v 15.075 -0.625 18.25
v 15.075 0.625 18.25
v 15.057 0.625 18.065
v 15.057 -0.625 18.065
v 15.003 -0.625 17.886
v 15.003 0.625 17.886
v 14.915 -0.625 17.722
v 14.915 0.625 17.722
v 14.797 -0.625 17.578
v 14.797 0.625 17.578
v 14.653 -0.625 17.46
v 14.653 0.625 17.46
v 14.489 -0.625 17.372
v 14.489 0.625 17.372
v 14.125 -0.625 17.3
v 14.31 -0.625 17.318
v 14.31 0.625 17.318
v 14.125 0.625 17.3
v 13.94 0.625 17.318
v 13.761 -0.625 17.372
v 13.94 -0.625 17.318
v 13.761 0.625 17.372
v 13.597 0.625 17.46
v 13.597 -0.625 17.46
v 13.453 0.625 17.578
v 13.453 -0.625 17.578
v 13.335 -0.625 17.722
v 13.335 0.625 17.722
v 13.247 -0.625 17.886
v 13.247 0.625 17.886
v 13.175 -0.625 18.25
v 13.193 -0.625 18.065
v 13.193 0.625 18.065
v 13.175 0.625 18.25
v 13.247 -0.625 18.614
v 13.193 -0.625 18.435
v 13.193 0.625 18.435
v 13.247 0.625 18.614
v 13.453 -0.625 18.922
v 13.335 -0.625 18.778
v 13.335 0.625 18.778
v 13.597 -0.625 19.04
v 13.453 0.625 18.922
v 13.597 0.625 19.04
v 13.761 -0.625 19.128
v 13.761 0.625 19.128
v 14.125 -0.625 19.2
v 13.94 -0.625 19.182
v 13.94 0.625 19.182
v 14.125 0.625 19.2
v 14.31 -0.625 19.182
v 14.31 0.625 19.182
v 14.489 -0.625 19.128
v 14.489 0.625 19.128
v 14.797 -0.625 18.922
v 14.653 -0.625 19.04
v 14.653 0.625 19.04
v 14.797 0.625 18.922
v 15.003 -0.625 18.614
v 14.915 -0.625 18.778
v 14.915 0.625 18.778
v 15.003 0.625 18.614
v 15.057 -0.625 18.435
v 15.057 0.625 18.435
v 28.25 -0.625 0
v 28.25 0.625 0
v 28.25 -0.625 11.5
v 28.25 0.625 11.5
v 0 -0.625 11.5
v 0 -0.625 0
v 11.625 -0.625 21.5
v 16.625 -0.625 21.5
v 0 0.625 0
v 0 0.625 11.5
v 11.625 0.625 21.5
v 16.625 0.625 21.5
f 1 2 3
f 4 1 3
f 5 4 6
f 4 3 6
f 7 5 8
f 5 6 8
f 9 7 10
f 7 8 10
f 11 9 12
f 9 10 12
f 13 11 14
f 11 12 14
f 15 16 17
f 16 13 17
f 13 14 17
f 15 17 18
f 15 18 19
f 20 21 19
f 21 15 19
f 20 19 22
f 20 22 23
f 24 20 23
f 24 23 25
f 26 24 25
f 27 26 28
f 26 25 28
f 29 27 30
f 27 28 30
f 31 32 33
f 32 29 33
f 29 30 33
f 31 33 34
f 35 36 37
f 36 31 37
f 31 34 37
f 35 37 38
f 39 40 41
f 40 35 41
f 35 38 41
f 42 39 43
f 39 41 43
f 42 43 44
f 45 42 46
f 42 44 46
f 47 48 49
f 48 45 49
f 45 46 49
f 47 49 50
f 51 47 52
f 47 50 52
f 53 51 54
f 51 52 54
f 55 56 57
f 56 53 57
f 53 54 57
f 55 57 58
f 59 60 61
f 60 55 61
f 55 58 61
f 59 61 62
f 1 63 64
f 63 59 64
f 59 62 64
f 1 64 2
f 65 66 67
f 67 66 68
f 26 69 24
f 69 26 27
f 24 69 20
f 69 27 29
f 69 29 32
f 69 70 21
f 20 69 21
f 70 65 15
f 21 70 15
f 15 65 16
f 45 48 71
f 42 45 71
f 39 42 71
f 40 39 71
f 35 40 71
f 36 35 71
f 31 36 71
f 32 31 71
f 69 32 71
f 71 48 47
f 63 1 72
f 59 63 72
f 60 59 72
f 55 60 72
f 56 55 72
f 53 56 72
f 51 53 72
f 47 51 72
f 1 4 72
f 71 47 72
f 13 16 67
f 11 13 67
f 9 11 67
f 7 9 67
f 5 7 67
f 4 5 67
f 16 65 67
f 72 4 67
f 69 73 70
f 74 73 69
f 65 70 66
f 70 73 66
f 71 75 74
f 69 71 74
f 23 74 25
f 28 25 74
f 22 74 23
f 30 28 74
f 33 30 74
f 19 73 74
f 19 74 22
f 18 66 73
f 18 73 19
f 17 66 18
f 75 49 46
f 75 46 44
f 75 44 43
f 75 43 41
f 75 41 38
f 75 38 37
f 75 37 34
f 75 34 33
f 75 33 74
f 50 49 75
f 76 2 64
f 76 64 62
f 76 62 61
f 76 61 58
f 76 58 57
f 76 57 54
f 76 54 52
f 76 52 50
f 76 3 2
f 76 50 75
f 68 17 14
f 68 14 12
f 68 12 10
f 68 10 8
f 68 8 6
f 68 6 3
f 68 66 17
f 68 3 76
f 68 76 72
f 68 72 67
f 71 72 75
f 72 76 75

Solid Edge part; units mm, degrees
sketch "Sketch1" plane through (0, 0, 0) normal (0, -1, 0) x (1, 0, 0)
  line L0 (0, 0) -> (0, 5.75)
  line L1 (0, 11.5) -> (0, 5.75)
  line L2 (11.625, 21.5) -> (0, 11.5)
  line L3 (14.125, 21.5) -> (11.625, 21.5)
  line L4 (14.125, 21.5) -> (16.625, 21.5)
  line L5 (16.625, 21.5) -> (28.25, 11.5)
  line L6 (28.25, 0) -> (28.25, 11.5)
  line L7 (0, 0) -> (28.25, 0)
  circle A0 centre (14.125, 18.25) radius 0.95
extrude "Protrusion1" add sketch "Sketch1" along normal mid plane 1.25
properties material "Stainless Steel, 420"
